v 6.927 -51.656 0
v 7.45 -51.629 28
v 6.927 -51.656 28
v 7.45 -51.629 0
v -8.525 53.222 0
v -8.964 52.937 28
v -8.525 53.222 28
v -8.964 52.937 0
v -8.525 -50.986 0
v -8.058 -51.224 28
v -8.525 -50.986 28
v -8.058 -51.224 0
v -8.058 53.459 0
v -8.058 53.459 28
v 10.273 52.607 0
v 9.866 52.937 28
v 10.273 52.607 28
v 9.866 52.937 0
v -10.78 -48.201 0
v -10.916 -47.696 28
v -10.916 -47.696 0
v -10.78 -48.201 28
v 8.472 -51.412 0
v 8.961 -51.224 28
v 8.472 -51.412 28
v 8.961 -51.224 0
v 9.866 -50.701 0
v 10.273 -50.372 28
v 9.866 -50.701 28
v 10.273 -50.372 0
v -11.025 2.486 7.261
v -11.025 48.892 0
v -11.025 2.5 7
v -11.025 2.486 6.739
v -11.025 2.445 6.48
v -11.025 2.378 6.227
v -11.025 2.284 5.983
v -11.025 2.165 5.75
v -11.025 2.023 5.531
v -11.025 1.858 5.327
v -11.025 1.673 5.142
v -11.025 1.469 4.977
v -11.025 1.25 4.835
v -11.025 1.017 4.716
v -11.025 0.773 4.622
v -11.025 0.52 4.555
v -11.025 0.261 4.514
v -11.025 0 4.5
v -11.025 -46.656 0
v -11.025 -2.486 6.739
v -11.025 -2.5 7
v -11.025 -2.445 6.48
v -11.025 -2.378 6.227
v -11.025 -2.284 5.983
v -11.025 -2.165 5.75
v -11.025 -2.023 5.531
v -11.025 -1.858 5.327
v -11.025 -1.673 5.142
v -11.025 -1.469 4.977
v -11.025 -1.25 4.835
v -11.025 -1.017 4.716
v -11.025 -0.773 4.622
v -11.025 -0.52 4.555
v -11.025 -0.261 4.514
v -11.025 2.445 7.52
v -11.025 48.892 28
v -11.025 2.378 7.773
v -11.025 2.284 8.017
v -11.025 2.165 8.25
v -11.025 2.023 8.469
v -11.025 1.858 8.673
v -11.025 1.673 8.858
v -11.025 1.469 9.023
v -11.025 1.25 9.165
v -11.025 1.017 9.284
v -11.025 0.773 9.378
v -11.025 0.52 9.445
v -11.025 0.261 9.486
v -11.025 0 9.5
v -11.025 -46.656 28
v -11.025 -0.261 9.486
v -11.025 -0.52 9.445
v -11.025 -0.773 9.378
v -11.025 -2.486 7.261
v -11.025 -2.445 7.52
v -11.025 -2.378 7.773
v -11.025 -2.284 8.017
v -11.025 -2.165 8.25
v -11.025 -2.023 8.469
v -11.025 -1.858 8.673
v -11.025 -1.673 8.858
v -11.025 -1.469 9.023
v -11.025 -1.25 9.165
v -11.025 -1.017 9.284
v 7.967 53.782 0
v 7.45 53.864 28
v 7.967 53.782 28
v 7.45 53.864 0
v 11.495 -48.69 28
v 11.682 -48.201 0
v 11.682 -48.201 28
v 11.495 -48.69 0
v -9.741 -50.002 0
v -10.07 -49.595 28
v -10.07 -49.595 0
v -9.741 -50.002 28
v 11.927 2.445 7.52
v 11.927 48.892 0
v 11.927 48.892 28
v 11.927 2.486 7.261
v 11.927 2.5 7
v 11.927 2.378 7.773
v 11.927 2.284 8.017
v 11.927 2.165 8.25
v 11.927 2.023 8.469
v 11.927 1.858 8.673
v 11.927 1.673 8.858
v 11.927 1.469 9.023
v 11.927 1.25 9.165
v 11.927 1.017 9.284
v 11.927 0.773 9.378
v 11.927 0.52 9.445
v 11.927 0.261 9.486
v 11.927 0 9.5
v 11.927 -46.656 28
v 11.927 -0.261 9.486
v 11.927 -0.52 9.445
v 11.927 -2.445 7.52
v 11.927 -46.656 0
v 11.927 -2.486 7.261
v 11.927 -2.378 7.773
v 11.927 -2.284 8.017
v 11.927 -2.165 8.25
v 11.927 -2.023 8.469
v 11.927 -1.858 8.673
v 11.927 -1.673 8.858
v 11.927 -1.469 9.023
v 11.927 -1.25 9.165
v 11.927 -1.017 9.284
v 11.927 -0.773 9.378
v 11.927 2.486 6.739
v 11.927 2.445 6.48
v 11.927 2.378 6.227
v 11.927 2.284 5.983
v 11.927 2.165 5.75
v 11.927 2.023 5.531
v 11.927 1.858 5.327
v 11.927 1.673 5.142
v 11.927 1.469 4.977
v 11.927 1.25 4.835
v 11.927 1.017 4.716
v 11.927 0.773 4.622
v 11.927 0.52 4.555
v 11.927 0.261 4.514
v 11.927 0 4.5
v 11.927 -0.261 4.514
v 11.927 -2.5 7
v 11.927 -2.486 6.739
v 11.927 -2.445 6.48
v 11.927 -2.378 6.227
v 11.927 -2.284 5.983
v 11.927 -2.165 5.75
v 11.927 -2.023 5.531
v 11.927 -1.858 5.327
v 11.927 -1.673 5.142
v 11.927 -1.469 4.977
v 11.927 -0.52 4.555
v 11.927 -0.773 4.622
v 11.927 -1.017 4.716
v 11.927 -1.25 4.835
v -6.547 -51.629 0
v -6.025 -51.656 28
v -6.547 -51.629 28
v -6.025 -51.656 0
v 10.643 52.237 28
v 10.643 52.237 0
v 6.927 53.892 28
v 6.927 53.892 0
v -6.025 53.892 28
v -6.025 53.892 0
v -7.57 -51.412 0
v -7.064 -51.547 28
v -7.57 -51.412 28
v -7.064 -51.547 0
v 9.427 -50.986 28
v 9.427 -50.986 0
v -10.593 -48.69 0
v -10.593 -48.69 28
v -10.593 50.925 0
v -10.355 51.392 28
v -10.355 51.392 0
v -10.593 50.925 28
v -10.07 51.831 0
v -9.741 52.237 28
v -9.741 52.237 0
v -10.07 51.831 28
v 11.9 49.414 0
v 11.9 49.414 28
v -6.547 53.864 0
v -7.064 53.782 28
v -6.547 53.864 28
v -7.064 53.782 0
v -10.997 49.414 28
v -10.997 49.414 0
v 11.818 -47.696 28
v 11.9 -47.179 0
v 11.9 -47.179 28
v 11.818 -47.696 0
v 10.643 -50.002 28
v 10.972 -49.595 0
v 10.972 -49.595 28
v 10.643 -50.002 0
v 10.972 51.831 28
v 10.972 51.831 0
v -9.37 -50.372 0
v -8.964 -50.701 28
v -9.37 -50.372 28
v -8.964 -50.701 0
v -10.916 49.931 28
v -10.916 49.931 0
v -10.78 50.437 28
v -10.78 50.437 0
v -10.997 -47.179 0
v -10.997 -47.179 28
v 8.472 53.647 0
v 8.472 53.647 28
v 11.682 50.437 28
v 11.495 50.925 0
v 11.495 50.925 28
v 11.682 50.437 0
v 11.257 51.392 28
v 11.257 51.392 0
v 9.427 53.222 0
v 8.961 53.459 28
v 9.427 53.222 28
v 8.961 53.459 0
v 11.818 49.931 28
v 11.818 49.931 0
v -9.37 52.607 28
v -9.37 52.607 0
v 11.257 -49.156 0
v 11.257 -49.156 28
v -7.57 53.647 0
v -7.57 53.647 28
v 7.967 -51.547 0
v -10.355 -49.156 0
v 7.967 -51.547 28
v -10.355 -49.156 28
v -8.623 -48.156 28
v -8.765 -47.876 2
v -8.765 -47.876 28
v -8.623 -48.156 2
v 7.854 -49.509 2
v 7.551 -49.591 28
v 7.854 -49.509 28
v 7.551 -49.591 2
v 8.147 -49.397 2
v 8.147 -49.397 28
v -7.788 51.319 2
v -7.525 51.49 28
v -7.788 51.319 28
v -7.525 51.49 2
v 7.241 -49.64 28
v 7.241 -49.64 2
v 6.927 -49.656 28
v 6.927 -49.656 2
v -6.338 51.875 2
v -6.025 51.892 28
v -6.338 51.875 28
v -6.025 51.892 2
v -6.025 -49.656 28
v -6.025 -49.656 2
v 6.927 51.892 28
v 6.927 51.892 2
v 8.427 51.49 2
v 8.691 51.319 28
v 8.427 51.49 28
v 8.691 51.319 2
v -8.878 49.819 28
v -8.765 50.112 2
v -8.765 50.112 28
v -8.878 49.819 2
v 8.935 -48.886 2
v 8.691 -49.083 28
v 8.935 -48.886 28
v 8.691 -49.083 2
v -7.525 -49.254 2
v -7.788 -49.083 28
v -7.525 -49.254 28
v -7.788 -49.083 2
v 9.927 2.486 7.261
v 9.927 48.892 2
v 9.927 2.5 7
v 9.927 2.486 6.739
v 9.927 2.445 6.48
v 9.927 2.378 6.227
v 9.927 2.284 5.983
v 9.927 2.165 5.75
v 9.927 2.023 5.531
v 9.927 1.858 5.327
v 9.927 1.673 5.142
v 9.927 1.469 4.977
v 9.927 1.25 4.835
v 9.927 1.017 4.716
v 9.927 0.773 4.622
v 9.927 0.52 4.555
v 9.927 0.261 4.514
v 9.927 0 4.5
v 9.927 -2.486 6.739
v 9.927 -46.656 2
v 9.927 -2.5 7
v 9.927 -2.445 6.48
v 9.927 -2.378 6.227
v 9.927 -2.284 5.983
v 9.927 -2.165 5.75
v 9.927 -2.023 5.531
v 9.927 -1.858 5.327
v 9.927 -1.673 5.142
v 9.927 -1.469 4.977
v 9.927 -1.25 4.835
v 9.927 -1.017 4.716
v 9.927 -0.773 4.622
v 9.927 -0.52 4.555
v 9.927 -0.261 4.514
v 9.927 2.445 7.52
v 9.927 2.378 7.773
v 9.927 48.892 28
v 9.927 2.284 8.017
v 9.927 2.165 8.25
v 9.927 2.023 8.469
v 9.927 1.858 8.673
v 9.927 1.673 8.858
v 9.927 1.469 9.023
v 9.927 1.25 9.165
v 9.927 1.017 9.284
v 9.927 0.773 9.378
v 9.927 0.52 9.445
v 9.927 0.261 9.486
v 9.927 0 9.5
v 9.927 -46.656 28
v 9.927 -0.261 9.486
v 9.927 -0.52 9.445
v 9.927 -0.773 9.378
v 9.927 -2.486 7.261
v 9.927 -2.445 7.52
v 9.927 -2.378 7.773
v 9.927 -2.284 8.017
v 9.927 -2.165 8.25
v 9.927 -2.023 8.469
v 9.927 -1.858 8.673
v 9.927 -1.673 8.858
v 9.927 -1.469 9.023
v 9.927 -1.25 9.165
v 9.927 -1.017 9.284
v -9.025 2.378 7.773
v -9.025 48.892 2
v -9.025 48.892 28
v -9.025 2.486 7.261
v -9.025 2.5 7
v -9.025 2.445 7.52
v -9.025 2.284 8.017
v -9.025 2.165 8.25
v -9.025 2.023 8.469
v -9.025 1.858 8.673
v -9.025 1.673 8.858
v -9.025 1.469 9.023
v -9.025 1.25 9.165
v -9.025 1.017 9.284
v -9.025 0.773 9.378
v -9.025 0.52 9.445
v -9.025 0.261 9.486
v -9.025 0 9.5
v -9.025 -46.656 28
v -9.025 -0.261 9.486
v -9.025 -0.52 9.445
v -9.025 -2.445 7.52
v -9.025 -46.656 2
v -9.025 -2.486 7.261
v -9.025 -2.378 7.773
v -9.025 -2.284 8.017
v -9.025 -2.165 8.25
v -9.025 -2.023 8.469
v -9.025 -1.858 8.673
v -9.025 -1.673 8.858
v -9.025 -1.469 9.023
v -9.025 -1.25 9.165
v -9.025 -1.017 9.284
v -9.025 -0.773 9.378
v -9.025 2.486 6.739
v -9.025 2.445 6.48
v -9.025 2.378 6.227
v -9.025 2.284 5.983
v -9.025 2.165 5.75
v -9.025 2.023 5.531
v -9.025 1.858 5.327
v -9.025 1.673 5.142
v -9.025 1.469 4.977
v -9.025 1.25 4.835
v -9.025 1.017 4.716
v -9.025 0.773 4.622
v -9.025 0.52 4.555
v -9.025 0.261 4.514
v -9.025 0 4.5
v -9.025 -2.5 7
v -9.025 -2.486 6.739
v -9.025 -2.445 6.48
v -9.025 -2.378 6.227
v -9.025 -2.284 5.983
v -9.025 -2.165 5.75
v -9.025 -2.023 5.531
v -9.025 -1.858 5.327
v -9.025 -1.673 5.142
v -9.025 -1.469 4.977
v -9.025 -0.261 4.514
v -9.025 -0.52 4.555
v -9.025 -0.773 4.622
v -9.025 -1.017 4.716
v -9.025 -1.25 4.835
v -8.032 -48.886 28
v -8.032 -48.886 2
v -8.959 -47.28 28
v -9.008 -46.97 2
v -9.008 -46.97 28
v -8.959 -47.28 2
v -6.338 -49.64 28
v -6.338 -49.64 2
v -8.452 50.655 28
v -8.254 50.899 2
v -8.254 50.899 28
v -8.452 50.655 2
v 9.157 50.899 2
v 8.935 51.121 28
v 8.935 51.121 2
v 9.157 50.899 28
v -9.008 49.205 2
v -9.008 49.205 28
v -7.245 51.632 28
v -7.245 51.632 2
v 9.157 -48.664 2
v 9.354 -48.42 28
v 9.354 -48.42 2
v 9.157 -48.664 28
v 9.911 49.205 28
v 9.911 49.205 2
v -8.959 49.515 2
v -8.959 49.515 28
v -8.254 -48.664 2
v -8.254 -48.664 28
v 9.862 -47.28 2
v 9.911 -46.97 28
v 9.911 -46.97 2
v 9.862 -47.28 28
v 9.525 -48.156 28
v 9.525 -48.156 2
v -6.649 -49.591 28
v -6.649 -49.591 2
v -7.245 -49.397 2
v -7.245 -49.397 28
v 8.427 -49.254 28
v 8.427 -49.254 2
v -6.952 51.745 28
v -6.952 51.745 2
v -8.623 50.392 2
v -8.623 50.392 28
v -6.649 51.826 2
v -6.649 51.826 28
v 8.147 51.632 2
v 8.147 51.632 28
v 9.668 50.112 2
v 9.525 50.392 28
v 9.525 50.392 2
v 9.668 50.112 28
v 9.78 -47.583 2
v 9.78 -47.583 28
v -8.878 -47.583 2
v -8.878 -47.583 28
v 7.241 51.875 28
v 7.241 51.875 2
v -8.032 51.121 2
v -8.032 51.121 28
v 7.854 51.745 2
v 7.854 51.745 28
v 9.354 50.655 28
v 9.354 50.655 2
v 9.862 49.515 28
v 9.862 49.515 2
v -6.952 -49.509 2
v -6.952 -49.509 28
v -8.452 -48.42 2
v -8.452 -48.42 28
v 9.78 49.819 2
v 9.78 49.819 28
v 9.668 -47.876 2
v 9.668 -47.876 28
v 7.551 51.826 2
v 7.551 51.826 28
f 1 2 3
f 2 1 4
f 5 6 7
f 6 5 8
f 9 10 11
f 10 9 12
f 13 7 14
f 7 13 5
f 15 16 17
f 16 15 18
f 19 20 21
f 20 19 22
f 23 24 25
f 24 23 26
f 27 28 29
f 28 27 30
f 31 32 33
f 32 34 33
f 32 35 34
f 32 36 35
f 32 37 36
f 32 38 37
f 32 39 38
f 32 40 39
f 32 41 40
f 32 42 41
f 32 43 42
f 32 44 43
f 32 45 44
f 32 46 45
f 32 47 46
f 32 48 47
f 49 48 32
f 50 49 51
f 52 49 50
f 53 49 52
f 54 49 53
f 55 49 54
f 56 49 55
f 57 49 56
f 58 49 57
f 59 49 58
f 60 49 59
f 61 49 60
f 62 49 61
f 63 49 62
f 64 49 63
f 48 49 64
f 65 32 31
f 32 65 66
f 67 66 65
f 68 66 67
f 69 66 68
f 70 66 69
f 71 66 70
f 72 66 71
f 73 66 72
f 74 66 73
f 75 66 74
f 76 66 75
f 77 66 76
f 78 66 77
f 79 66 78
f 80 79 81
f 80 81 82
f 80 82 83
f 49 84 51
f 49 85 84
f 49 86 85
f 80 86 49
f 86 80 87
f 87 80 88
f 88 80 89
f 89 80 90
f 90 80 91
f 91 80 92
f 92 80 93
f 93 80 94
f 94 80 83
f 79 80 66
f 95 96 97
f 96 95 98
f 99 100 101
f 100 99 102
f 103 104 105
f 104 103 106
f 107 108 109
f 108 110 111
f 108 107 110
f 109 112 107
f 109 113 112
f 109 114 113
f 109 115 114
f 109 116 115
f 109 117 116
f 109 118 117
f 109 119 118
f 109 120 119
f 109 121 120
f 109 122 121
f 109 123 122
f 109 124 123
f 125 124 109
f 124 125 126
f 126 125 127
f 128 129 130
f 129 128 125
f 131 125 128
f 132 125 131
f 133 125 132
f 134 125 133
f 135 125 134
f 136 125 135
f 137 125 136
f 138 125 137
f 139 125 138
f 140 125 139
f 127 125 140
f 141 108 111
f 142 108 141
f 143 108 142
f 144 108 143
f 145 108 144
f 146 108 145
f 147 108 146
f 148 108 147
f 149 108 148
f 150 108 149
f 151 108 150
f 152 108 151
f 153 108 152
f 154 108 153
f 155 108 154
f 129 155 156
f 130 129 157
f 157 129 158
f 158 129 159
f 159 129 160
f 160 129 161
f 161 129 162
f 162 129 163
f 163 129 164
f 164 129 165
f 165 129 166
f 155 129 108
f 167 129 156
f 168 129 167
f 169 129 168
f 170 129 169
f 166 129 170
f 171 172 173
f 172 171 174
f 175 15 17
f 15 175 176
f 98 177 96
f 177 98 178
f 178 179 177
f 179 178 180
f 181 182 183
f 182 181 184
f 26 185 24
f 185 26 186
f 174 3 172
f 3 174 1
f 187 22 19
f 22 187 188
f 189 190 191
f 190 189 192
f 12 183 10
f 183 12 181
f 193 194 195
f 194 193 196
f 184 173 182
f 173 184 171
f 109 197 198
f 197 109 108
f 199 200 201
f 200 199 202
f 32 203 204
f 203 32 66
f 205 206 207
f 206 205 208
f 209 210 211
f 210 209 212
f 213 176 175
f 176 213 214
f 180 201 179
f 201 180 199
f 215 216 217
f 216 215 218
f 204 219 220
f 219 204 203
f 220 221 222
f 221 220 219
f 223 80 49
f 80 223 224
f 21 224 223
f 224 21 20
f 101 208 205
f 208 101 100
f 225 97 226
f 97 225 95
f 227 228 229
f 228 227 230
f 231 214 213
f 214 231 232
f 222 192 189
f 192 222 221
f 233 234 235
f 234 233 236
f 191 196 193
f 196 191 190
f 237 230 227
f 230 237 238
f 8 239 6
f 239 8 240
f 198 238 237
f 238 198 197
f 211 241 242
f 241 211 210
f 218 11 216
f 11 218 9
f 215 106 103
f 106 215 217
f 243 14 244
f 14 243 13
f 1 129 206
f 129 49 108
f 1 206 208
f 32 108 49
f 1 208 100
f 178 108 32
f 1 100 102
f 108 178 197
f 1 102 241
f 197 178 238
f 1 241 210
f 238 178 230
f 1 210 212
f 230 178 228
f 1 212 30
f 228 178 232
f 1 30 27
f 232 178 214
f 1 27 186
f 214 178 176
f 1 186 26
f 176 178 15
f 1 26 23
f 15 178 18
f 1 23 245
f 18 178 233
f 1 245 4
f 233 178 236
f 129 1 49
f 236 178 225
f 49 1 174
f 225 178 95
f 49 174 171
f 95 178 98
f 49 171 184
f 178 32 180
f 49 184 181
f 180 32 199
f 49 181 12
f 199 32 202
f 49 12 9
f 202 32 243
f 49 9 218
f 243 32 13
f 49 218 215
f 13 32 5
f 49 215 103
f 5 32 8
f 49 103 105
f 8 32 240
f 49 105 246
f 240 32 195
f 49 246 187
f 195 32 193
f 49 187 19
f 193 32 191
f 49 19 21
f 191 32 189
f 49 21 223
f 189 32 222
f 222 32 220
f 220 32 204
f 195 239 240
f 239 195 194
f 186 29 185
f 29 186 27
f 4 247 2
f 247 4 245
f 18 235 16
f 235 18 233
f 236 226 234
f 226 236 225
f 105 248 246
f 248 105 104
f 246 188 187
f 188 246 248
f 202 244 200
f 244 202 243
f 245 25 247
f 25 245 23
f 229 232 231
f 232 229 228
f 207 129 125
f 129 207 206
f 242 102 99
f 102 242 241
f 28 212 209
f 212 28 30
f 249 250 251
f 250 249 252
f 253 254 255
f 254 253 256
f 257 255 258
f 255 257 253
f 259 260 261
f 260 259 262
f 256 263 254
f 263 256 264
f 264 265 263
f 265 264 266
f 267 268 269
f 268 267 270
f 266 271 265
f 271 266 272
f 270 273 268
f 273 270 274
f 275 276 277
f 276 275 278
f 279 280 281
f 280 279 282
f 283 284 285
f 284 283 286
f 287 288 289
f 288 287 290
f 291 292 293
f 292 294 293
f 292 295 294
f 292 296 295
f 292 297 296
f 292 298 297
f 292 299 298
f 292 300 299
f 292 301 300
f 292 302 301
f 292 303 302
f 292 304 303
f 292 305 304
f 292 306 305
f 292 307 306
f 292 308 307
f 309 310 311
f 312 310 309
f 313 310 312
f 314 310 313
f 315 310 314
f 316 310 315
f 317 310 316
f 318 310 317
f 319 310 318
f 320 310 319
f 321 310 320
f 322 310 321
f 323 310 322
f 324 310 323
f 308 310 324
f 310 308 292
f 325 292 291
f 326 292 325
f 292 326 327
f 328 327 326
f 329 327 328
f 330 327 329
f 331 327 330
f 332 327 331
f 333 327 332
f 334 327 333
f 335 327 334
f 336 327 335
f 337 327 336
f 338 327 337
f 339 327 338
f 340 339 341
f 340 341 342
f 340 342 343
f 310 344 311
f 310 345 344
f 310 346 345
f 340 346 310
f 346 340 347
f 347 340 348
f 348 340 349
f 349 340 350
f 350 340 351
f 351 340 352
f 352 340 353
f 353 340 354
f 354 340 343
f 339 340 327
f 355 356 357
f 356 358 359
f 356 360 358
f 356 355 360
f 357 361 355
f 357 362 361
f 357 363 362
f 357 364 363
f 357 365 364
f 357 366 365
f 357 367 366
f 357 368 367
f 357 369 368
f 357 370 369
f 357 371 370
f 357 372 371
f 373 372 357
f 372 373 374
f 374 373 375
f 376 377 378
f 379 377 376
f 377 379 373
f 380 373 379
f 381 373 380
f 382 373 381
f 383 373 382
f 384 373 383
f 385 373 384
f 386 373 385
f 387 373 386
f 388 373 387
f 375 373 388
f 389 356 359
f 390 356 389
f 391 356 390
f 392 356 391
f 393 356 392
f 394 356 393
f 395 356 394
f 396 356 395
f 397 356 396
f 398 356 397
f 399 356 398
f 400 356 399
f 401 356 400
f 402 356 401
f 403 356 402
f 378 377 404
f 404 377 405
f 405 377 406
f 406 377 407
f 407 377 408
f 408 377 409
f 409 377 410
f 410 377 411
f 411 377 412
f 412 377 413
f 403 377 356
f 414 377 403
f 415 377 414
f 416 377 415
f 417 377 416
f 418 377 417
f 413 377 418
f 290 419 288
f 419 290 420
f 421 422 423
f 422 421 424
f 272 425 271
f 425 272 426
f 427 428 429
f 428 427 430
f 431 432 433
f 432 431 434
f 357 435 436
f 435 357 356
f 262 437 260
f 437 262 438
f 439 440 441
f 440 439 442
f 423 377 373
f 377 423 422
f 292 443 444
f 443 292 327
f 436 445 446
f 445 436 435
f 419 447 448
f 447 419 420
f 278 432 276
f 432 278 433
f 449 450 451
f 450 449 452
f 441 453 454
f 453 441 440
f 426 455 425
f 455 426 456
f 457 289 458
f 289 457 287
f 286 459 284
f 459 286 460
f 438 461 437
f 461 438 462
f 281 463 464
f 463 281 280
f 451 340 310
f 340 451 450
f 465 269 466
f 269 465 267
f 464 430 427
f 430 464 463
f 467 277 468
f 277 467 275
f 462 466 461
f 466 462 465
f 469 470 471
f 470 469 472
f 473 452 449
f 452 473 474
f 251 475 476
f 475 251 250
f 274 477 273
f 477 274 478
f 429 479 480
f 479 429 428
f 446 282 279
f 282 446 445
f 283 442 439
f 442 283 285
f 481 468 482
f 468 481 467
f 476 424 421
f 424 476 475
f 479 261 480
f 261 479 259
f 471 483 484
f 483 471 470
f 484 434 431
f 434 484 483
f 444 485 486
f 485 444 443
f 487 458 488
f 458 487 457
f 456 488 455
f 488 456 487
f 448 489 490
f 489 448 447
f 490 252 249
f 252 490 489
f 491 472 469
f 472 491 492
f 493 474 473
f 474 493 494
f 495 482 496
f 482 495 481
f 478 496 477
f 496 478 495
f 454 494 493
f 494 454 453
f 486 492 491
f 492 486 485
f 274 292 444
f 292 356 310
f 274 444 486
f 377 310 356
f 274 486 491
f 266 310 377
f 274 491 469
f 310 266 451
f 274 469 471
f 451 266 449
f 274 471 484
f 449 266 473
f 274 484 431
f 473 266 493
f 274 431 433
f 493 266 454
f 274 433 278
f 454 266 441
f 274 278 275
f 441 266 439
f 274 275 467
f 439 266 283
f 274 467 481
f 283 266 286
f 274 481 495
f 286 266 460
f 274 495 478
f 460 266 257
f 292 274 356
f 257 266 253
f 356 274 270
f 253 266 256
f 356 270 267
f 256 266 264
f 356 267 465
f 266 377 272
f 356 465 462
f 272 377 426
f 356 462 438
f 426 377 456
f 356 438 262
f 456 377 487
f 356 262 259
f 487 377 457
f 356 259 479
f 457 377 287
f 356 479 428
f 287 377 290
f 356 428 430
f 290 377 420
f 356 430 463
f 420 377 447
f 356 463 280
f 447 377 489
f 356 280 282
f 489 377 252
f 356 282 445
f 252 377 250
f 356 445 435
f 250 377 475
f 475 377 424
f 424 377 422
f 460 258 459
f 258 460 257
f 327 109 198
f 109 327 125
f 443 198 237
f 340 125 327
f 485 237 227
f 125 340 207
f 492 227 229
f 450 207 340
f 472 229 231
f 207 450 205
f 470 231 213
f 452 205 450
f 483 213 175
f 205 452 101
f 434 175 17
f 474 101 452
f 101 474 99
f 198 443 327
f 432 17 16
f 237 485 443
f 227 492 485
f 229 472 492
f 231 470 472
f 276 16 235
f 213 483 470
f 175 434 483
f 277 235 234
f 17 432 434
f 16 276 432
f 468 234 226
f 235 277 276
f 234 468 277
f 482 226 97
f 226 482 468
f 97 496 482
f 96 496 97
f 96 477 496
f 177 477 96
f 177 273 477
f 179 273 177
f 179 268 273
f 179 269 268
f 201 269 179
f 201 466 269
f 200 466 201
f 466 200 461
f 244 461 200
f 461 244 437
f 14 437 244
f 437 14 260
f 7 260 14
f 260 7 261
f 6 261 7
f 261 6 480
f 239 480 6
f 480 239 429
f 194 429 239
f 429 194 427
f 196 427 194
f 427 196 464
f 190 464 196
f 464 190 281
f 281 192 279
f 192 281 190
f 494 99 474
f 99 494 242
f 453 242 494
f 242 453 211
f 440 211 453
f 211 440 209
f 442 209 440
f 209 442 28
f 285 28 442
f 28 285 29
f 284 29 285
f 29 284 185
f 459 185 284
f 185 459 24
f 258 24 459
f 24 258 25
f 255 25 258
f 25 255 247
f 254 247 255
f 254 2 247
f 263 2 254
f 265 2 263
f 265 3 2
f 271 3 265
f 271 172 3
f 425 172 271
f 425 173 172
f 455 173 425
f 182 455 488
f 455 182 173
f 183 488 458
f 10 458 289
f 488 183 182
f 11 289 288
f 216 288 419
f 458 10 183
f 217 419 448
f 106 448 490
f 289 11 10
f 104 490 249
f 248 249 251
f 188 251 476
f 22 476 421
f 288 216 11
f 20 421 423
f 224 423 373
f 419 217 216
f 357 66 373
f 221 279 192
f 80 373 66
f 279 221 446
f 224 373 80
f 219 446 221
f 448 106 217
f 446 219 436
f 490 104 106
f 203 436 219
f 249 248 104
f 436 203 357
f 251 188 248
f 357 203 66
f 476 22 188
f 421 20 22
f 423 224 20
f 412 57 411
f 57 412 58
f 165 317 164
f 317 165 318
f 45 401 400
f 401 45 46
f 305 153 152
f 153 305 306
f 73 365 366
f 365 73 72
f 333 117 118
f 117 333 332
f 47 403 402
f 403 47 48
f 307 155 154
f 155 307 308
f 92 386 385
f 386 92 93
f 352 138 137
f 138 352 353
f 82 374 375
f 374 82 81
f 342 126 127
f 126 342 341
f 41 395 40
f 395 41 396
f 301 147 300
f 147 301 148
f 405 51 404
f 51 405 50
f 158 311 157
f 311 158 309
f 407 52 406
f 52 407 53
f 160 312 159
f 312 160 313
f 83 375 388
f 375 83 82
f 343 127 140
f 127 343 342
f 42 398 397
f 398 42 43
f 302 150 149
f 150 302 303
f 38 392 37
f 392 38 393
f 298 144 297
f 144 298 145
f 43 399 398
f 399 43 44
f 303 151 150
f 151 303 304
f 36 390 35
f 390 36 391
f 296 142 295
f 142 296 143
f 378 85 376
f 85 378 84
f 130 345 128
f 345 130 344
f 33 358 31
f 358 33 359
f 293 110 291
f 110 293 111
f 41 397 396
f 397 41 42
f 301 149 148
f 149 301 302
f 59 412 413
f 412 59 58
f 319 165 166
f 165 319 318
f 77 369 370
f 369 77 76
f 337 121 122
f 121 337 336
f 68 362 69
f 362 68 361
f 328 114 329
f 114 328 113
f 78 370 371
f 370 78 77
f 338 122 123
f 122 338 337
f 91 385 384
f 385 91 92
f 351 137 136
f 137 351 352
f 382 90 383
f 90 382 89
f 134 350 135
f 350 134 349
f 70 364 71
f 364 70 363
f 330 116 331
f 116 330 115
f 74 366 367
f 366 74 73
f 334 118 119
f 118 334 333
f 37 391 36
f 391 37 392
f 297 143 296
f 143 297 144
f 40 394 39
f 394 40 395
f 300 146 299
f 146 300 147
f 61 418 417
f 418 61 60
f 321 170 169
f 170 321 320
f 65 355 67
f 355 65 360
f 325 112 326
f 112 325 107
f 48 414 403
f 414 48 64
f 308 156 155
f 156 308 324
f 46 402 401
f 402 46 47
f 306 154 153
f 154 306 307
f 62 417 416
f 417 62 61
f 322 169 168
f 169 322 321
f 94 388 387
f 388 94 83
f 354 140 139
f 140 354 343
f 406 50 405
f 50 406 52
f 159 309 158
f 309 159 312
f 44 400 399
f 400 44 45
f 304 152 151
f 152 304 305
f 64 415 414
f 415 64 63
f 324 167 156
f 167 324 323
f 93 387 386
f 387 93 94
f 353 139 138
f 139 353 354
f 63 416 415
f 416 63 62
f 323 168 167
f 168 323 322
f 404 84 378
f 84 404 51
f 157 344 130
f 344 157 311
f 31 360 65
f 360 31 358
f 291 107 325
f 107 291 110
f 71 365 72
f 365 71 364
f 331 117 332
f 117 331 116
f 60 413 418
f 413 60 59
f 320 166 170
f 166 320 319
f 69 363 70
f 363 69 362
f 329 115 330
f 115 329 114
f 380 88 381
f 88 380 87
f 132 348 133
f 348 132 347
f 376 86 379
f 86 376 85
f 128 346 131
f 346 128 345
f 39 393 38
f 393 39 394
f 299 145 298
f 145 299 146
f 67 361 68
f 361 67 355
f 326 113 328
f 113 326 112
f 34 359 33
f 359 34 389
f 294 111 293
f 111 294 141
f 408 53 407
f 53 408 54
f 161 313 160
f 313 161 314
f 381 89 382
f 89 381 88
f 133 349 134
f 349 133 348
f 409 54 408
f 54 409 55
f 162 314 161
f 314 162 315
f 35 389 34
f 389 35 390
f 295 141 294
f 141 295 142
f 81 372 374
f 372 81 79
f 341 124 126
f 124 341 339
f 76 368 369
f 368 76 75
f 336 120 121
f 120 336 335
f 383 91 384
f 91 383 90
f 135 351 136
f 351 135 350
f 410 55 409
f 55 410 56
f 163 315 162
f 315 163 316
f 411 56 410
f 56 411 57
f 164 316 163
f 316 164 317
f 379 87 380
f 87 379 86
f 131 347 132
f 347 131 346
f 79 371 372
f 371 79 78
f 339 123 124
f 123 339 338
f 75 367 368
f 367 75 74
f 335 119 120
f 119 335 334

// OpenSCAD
// AUTOMATICALLY GENERATED FILE: Letter_I
// SIGN SCULPTOR ENGINE V2

Render_Mode = "Body"; // Set to "Lid" to export the cover
Letter = "I";
Font_Size = 100;
Font_Name = "Arial:style=Black";
Light_Type = "Silicone_Neon_6mm";

// -- Engineering Constants --
Sign_Height = 30.0;
Wall_Thickness = 2.0;
Base_Thickness = 2.0;
Lid_Tolerance = 0.15;
Hole_Height = 5.0;
Hole_Size = 5.0;

// -- Logic Engine --
CW = (Light_Type == "Silicone_Neon_6mm") ? 6.0 :
     (Light_Type == "Silicone_Neon_8mm") ? 8.0 :
     (Light_Type == "LED_Strip_10mm")    ? 10.5 :
     (Light_Type == "Individual_Pixels")  ? 14.0 : 6.0;

Lip_Overhang = (Light_Type == "Silicone_Neon_6mm" || Light_Type == "Silicone_Neon_8mm") ? 0.4 : 0.0;

$fn = 60;

module letter_shape() {
    text(text=Letter, size=Font_Size, font=Font_Name, halign="center", valign="center");
}

module body_geometry() {
    difference() {
        // 1. Positive Block
        linear_extrude(Sign_Height)
            offset(r = CW/2 + Wall_Thickness)
            letter_shape();

        // 2. Light Channel
        translate([0,0, Base_Thickness])
            linear_extrude(Sign_Height + 1)
            offset(r = CW/2)
            letter_shape();

        // 3. Friction Lip
        if (Lip_Overhang > 0) {
            translate([0,0, Sign_Height - 2.0])
                linear_extrude(3.0)
                difference() {
                    offset(r = CW/2 + 5) letter_shape();
                    offset(r = CW/2 - Lip_Overhang) letter_shape();
                }
        }
        
        // 4. Lid Shelf
        translate([0,0, Sign_Height - 2.0])
            linear_extrude(3.0)
            offset(r = CW/2 + 1.5)
            letter_shape();

        // 5. WIRE CHANNELS (Dynamic Side Holes)
        // Left Hole
        translate([-Font_Size/1.8, 0, Hole_Height + Base_Thickness])
            rotate([0, 90, 0])
            cylinder(h = Font_Size, r = Hole_Size/2);
            
        // Right Hole
        translate([Font_Size/1.8, 0, Hole_Height + Base_Thickness])
            rotate([0, -90, 0])
            cylinder(h = Font_Size, r = Hole_Size/2);
    }
}

module lid_geometry() {
    color("White")
        linear_extrude(2.0)
        offset(r = (CW/2 + 1.5) - Lid_Tolerance)
        letter_shape();
}

// Render Controller
if (Render_Mode == "Body") {
    body_geometry();
} else if (Render_Mode == "Lid") {
    lid_geometry();
}
